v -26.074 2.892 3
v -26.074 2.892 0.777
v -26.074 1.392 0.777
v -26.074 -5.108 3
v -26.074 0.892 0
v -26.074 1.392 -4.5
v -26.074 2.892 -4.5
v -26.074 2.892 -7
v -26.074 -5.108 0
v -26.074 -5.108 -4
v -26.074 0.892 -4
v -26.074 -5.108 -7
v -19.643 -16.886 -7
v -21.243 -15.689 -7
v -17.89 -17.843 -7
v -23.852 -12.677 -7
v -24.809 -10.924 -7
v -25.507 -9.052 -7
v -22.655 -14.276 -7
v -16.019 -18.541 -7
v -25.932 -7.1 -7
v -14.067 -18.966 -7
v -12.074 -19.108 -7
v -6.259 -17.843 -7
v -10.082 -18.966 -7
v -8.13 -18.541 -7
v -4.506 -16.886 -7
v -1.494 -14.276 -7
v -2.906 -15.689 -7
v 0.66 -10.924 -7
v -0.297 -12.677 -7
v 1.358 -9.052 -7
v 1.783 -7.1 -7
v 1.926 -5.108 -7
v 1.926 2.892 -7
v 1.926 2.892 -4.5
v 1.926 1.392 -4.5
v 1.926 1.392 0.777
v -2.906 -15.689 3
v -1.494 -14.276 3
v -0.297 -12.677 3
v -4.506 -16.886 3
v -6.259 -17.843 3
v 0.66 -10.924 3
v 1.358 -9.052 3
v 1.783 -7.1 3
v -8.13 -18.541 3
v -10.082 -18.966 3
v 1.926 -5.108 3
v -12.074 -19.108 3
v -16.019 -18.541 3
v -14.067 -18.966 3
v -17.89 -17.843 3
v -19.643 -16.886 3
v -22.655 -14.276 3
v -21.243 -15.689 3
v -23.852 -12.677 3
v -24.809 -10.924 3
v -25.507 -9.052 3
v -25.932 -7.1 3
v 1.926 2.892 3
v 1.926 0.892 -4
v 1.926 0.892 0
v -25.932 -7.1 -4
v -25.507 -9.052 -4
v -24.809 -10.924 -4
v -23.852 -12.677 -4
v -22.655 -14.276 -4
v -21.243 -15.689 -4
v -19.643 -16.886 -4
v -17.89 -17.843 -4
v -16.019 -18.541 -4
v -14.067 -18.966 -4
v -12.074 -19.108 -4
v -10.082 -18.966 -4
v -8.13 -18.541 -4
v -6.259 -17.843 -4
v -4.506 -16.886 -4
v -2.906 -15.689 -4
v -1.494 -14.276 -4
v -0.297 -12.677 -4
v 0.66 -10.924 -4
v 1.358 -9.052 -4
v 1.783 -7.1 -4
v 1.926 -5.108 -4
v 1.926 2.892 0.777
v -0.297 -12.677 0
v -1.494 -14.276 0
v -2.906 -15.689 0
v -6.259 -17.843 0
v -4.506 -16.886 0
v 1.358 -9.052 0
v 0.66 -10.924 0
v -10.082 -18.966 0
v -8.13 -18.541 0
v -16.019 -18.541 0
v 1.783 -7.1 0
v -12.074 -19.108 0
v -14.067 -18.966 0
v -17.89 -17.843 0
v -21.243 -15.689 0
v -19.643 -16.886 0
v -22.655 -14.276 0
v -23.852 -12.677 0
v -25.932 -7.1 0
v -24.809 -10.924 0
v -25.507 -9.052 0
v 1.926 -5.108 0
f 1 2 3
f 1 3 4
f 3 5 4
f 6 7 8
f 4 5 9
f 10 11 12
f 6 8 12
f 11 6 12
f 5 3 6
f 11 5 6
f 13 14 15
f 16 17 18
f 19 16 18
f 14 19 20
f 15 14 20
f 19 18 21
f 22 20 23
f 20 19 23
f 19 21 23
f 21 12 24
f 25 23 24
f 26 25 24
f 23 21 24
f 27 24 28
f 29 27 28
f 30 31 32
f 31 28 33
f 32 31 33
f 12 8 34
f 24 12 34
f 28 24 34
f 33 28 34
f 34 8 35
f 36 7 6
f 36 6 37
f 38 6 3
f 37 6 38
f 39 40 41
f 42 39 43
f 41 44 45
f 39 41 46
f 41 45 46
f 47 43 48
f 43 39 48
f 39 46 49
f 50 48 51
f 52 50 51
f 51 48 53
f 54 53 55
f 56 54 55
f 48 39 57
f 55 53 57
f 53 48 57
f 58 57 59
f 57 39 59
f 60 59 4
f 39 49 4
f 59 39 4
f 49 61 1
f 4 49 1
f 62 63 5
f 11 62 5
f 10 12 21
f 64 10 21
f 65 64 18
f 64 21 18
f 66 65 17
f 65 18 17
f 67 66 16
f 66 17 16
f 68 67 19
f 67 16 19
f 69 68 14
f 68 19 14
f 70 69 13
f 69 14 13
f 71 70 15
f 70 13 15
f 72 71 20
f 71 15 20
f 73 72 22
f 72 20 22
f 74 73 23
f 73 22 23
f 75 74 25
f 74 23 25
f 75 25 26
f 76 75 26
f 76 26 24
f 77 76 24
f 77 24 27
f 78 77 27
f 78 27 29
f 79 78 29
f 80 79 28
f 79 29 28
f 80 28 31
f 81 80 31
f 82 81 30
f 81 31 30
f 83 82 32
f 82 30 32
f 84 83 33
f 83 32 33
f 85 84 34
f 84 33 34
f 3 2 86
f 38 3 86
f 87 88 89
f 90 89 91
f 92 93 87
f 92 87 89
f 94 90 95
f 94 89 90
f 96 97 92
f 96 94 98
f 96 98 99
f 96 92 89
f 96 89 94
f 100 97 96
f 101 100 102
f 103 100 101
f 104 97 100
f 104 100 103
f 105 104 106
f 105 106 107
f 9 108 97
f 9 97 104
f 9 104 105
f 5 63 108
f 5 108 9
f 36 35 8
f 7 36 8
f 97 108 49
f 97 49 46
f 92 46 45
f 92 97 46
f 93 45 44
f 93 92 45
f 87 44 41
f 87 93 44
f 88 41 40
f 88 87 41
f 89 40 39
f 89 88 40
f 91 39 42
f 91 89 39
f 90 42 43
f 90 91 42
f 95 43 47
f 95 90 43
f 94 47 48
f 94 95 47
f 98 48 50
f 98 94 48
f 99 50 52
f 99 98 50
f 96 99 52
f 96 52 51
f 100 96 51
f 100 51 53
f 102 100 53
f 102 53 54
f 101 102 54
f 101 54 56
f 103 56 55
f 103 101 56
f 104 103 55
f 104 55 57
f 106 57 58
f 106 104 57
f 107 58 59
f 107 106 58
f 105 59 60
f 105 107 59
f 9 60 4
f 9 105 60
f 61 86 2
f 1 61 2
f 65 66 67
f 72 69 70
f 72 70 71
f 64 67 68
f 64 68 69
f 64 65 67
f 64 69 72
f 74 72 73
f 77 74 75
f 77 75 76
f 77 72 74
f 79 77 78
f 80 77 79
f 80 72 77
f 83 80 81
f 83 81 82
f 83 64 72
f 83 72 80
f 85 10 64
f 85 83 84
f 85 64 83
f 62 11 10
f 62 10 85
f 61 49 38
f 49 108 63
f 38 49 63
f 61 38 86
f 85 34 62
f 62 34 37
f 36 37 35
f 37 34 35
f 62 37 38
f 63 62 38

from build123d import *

# Parameters (mm, degrees)
BOSS_EXTRUDE1_DEPTH = 3
SKETCH2_W           = 28
SKETCH2_H           = 2
BOSS_EXTRUDE2_DEPTH = 4
BOSS_EXTRUDE3_START = 3
BOSS_EXTRUDE3_DEPTH = 3
SKETCH4_W           = 28
SKETCH4_H           = 5.276937717
CUT_EXTRUDE1_DEPTH  = 1.5


with BuildPart() as part:
    # Sketch1 → Boss-Extrude1 (new body)
    with BuildSketch(Plane.XY):
        with BuildLine():
            Line((-26.074492775, 2.891966759), (1.925507225, 2.891966759))
            Line((1.925507225, 2.891966759), (1.925507225, -5.108033241))
            ThreePointArc((1.925507225, -5.108033241), (-12.074492775, -19.108033241), (-26.074492775, -5.108033241))
            Line((-26.074492775, -5.108033241), (-26.074492775, 2.891966759))
        make_face()
    extrude(amount=BOSS_EXTRUDE1_DEPTH)

    # Sketch2 → Boss-Extrude2 (add)
    with BuildSketch(Plane(origin=(0, 0, 0), x_dir=(-1, 0, 0), z_dir=(0, 0, -1))):
        with Locations((12.074492775, 1.891966759)):
            Rectangle(SKETCH2_W, SKETCH2_H)
    extrude(amount=BOSS_EXTRUDE2_DEPTH)

    # Sketch3 → Boss-Extrude3 (add)
    with BuildSketch(Plane(origin=(0, 0, -4), x_dir=(-1, 0, 0), z_dir=(0, 0, -1)).offset(BOSS_EXTRUDE3_START)):
        with BuildLine():
            Line((-1.925507225, 2.891966759), (26.074492775, 2.891966759))
            Line((26.074492775, 2.891966759), (26.074492775, -5.108033241))
            ThreePointArc((26.074492775, -5.108033241), (12.074492775, -19.108033241), (-1.925507225, -5.108033241))
            Line((-1.925507225, -5.108033241), (-1.925507225, 2.891966759))
        make_face()
    extrude(amount=-BOSS_EXTRUDE3_DEPTH)

    # Sketch4 → Cut-Extrude1 (cut)
    with BuildSketch(Plane(origin=(0, 2.891966759, 0), x_dir=(1, 0, 0), z_dir=(0, 1, 0))):
        with Locations((-12.074492775, 1.861531141)):
            Rectangle(SKETCH4_W, SKETCH4_H)
    extrude(amount=-CUT_EXTRUDE1_DEPTH, mode=Mode.SUBTRACT)


solid = part.part
